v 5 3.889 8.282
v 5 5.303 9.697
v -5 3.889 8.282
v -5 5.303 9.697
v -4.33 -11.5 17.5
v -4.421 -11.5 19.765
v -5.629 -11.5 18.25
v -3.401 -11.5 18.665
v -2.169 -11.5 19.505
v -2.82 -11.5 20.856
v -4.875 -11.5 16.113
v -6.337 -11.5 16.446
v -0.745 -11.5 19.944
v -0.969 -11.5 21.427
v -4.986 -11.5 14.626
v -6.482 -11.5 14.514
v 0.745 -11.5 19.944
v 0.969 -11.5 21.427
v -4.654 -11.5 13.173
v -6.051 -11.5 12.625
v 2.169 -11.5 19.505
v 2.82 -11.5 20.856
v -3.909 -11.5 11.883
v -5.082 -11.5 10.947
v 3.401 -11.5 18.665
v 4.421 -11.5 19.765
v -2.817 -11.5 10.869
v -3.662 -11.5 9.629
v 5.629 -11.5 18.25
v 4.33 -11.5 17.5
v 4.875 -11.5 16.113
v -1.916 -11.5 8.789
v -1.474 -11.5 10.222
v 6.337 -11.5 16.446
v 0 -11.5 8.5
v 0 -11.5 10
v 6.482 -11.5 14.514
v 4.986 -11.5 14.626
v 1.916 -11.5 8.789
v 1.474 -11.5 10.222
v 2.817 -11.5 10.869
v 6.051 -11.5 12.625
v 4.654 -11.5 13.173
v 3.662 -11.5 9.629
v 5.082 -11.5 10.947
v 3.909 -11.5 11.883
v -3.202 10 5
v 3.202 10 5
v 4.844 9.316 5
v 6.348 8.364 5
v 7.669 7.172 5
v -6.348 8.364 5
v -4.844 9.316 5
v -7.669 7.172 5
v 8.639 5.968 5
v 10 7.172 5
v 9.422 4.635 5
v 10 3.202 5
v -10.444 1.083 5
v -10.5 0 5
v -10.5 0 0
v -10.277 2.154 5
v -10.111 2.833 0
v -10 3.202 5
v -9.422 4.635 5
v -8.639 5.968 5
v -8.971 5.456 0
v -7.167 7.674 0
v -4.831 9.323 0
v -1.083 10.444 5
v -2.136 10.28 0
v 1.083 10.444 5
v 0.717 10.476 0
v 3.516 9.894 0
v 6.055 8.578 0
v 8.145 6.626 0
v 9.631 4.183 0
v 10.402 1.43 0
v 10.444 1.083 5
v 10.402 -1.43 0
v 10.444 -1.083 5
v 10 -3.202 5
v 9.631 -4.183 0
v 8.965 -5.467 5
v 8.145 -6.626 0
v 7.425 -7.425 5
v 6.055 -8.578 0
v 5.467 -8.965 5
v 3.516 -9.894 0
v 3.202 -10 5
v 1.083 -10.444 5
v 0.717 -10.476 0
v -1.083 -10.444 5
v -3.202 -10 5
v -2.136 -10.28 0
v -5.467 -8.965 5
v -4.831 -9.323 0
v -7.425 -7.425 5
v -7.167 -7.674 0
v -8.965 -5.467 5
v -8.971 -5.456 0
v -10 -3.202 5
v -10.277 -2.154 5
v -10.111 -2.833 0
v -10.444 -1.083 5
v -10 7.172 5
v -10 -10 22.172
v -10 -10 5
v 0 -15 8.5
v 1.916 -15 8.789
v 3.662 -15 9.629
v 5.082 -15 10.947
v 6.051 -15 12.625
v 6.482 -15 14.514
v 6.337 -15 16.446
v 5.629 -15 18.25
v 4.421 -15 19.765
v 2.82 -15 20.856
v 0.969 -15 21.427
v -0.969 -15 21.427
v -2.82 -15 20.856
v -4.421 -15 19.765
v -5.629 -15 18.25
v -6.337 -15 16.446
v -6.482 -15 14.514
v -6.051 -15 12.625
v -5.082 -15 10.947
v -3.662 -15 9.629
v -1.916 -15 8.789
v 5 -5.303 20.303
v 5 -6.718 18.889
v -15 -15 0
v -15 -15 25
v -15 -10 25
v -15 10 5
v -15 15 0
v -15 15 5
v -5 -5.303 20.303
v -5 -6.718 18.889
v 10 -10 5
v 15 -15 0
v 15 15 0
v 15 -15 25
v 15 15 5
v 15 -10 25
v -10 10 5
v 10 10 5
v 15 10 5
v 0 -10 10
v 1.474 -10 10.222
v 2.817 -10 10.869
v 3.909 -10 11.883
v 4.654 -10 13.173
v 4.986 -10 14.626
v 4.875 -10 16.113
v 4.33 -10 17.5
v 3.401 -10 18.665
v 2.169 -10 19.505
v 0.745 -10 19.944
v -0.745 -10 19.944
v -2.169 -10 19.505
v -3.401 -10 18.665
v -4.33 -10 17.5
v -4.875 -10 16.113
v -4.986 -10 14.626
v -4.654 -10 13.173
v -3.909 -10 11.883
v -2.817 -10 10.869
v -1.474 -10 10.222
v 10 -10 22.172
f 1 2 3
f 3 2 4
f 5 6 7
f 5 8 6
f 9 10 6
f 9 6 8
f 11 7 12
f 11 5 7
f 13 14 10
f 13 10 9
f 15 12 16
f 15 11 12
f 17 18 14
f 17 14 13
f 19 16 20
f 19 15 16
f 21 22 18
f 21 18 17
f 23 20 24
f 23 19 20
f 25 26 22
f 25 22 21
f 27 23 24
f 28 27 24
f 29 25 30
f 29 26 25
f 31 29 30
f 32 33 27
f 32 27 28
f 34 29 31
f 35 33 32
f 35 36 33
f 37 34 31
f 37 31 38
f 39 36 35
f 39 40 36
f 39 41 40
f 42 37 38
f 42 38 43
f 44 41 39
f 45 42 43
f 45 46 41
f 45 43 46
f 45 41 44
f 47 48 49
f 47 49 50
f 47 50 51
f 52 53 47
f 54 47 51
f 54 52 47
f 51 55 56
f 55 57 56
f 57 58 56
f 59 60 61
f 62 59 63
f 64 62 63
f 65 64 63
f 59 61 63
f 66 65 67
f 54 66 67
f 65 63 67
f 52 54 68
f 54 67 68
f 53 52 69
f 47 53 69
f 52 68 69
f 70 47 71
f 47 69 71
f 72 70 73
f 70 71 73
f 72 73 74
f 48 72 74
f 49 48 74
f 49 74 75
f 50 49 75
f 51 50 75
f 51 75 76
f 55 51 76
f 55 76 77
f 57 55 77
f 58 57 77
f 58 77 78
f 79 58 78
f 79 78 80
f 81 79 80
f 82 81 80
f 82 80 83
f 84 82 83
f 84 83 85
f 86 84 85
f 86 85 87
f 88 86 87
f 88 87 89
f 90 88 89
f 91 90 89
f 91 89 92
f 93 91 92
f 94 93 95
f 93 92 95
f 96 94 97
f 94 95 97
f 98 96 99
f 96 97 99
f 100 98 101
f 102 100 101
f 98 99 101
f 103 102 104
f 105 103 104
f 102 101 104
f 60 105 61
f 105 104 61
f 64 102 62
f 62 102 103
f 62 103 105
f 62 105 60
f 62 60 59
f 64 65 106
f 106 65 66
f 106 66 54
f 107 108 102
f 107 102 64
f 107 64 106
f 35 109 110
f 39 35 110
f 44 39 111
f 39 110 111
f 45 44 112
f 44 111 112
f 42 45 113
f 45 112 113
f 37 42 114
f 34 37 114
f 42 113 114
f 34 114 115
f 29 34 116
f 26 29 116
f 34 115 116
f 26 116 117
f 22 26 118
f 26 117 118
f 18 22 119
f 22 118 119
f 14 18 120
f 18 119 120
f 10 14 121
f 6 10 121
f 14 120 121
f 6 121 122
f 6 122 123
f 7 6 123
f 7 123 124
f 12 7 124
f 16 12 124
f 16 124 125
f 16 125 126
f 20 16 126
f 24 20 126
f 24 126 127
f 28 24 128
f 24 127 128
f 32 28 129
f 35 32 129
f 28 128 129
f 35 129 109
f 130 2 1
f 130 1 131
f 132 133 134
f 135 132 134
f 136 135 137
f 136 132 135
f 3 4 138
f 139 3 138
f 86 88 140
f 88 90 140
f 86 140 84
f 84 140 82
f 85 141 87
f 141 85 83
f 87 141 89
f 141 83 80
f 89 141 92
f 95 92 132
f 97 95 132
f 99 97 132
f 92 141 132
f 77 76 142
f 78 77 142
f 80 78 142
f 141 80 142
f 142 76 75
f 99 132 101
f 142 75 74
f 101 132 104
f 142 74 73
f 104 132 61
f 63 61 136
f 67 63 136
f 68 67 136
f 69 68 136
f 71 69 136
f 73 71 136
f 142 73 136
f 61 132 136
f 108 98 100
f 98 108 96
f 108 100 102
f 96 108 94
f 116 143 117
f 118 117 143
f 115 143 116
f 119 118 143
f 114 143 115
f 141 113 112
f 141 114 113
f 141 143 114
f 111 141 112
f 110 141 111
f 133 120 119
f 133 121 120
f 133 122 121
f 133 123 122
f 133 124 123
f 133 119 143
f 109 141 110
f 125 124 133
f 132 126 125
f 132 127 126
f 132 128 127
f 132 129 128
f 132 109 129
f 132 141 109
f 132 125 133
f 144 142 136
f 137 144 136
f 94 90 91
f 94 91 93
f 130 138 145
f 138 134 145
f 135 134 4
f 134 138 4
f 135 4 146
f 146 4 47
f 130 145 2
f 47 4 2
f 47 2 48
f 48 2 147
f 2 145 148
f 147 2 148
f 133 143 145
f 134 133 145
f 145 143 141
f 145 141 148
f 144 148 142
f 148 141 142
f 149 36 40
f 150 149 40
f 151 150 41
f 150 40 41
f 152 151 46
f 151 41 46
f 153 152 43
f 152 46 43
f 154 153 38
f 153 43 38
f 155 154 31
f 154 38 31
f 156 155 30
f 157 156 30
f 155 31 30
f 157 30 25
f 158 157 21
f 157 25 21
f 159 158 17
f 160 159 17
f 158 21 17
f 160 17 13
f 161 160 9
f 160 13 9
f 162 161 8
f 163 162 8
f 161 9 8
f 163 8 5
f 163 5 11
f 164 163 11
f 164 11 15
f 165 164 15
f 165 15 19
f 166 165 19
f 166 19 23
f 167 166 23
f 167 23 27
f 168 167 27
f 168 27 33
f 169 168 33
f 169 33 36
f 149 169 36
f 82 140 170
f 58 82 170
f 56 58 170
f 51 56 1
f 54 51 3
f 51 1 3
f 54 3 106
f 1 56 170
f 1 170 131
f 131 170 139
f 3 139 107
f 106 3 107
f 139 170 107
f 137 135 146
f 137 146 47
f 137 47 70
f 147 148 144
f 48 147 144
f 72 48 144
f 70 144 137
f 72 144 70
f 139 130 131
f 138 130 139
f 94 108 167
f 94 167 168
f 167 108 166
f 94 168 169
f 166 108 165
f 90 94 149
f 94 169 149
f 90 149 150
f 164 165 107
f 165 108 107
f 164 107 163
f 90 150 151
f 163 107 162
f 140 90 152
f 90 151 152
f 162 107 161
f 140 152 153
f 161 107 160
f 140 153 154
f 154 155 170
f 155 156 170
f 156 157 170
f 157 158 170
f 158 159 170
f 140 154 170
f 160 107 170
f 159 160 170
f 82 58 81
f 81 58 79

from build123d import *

# Parameters (mm, degrees)
SKETCH1_W           = 30
SKETCH1_H           = 30
BOSS_EXTRUDE1_DEPTH = 25
SKETCH2_W           = 20
SKETCH2_H           = 20
CUT_EXTRUDE1_DEPTH  = 20
CUT_EXTRUDE2_DEPTH  = 43
SKETCH4_W           = 30
SKETCH4_H           = 28.284271248
SKETCH4_W_2         = 10
SKETCH4_H_2         = 15
BOSS_EXTRUDE2_DEPTH = 2
SKETCH5_R           = 10.5
CUT_EXTRUDE4_DEPTH  = 5
SKETCH6_R           = 5
CUT_EXTRUDE6_DEPTH  = 5
SKETCH7_R           = 6.5
SKETCH7_R_2         = 5
CUT_EXTRUDE7_DEPTH  = 3.5


with BuildPart() as part:
    # Sketch1 → Boss-Extrude1 (new body)
    with BuildSketch(Plane(origin=(0, 0, 0), x_dir=(0, 1, 0), z_dir=(0, 0, 1))):
        Rectangle(SKETCH1_W, SKETCH1_H)
    extrude(amount=BOSS_EXTRUDE1_DEPTH)

    # Sketch2 → Cut-Extrude1 (cut)
    with BuildSketch(Plane.XY.offset(25)):
        Rectangle(SKETCH2_W, SKETCH2_H)
    extrude(amount=-CUT_EXTRUDE1_DEPTH, mode=Mode.SUBTRACT)

    # Sketch3 → Cut-Extrude2 (cut)
    with BuildSketch(Plane.YZ.offset(15)):
        Polygon((15, 25), (-10, 25), (10, 5), (15, 5), align=None)
    extrude(amount=-CUT_EXTRUDE2_DEPTH, mode=Mode.SUBTRACT)

    # Sketch4 → Boss-Extrude2 (add)
    with BuildSketch(Plane(origin=(0, 7.5, 7.5), x_dir=(-1, 0, 0), z_dir=(0, 0.7071067811865477, 0.7071067811865475))):
        with Locations((0, 10.606601718)):
            Rectangle(SKETCH4_W, SKETCH4_H)
        with Locations((0, 10.606601718)):
            Rectangle(SKETCH4_W_2, SKETCH4_H_2, mode=Mode.SUBTRACT)
    extrude(amount=-BOSS_EXTRUDE2_DEPTH)

    # Sketch5 → Cut-Extrude4 (cut)
    with BuildSketch(Plane(origin=(0, 0, 0), x_dir=(1, 0, 0), z_dir=(0, 0, -1))):
        with Locations(Location((0, 0, 0), (0, 0, 180))):
            Circle(SKETCH5_R)
    extrude(amount=-CUT_EXTRUDE4_DEPTH, mode=Mode.SUBTRACT)

    # Sketch6 → Cut-Extrude6 (cut)
    with BuildSketch(Plane.XZ.offset(15)):
        with Locations(Location((0, 15, 0), (0, 0, 270))):
            Circle(SKETCH6_R)
    extrude(amount=-CUT_EXTRUDE6_DEPTH, mode=Mode.SUBTRACT)

    # Sketch7 → Cut-Extrude7 (cut)
    with BuildSketch(Plane.XZ.offset(15)):
        with Locations(Location((0, 15, 0), (0, 0, 270))):
            Circle(SKETCH7_R)
        with Locations(Location((0, 15, 0), (0, 0, 270))):
            Circle(SKETCH7_R_2, mode=Mode.SUBTRACT)
    extrude(amount=-CUT_EXTRUDE7_DEPTH, mode=Mode.SUBTRACT)


solid = part.part
